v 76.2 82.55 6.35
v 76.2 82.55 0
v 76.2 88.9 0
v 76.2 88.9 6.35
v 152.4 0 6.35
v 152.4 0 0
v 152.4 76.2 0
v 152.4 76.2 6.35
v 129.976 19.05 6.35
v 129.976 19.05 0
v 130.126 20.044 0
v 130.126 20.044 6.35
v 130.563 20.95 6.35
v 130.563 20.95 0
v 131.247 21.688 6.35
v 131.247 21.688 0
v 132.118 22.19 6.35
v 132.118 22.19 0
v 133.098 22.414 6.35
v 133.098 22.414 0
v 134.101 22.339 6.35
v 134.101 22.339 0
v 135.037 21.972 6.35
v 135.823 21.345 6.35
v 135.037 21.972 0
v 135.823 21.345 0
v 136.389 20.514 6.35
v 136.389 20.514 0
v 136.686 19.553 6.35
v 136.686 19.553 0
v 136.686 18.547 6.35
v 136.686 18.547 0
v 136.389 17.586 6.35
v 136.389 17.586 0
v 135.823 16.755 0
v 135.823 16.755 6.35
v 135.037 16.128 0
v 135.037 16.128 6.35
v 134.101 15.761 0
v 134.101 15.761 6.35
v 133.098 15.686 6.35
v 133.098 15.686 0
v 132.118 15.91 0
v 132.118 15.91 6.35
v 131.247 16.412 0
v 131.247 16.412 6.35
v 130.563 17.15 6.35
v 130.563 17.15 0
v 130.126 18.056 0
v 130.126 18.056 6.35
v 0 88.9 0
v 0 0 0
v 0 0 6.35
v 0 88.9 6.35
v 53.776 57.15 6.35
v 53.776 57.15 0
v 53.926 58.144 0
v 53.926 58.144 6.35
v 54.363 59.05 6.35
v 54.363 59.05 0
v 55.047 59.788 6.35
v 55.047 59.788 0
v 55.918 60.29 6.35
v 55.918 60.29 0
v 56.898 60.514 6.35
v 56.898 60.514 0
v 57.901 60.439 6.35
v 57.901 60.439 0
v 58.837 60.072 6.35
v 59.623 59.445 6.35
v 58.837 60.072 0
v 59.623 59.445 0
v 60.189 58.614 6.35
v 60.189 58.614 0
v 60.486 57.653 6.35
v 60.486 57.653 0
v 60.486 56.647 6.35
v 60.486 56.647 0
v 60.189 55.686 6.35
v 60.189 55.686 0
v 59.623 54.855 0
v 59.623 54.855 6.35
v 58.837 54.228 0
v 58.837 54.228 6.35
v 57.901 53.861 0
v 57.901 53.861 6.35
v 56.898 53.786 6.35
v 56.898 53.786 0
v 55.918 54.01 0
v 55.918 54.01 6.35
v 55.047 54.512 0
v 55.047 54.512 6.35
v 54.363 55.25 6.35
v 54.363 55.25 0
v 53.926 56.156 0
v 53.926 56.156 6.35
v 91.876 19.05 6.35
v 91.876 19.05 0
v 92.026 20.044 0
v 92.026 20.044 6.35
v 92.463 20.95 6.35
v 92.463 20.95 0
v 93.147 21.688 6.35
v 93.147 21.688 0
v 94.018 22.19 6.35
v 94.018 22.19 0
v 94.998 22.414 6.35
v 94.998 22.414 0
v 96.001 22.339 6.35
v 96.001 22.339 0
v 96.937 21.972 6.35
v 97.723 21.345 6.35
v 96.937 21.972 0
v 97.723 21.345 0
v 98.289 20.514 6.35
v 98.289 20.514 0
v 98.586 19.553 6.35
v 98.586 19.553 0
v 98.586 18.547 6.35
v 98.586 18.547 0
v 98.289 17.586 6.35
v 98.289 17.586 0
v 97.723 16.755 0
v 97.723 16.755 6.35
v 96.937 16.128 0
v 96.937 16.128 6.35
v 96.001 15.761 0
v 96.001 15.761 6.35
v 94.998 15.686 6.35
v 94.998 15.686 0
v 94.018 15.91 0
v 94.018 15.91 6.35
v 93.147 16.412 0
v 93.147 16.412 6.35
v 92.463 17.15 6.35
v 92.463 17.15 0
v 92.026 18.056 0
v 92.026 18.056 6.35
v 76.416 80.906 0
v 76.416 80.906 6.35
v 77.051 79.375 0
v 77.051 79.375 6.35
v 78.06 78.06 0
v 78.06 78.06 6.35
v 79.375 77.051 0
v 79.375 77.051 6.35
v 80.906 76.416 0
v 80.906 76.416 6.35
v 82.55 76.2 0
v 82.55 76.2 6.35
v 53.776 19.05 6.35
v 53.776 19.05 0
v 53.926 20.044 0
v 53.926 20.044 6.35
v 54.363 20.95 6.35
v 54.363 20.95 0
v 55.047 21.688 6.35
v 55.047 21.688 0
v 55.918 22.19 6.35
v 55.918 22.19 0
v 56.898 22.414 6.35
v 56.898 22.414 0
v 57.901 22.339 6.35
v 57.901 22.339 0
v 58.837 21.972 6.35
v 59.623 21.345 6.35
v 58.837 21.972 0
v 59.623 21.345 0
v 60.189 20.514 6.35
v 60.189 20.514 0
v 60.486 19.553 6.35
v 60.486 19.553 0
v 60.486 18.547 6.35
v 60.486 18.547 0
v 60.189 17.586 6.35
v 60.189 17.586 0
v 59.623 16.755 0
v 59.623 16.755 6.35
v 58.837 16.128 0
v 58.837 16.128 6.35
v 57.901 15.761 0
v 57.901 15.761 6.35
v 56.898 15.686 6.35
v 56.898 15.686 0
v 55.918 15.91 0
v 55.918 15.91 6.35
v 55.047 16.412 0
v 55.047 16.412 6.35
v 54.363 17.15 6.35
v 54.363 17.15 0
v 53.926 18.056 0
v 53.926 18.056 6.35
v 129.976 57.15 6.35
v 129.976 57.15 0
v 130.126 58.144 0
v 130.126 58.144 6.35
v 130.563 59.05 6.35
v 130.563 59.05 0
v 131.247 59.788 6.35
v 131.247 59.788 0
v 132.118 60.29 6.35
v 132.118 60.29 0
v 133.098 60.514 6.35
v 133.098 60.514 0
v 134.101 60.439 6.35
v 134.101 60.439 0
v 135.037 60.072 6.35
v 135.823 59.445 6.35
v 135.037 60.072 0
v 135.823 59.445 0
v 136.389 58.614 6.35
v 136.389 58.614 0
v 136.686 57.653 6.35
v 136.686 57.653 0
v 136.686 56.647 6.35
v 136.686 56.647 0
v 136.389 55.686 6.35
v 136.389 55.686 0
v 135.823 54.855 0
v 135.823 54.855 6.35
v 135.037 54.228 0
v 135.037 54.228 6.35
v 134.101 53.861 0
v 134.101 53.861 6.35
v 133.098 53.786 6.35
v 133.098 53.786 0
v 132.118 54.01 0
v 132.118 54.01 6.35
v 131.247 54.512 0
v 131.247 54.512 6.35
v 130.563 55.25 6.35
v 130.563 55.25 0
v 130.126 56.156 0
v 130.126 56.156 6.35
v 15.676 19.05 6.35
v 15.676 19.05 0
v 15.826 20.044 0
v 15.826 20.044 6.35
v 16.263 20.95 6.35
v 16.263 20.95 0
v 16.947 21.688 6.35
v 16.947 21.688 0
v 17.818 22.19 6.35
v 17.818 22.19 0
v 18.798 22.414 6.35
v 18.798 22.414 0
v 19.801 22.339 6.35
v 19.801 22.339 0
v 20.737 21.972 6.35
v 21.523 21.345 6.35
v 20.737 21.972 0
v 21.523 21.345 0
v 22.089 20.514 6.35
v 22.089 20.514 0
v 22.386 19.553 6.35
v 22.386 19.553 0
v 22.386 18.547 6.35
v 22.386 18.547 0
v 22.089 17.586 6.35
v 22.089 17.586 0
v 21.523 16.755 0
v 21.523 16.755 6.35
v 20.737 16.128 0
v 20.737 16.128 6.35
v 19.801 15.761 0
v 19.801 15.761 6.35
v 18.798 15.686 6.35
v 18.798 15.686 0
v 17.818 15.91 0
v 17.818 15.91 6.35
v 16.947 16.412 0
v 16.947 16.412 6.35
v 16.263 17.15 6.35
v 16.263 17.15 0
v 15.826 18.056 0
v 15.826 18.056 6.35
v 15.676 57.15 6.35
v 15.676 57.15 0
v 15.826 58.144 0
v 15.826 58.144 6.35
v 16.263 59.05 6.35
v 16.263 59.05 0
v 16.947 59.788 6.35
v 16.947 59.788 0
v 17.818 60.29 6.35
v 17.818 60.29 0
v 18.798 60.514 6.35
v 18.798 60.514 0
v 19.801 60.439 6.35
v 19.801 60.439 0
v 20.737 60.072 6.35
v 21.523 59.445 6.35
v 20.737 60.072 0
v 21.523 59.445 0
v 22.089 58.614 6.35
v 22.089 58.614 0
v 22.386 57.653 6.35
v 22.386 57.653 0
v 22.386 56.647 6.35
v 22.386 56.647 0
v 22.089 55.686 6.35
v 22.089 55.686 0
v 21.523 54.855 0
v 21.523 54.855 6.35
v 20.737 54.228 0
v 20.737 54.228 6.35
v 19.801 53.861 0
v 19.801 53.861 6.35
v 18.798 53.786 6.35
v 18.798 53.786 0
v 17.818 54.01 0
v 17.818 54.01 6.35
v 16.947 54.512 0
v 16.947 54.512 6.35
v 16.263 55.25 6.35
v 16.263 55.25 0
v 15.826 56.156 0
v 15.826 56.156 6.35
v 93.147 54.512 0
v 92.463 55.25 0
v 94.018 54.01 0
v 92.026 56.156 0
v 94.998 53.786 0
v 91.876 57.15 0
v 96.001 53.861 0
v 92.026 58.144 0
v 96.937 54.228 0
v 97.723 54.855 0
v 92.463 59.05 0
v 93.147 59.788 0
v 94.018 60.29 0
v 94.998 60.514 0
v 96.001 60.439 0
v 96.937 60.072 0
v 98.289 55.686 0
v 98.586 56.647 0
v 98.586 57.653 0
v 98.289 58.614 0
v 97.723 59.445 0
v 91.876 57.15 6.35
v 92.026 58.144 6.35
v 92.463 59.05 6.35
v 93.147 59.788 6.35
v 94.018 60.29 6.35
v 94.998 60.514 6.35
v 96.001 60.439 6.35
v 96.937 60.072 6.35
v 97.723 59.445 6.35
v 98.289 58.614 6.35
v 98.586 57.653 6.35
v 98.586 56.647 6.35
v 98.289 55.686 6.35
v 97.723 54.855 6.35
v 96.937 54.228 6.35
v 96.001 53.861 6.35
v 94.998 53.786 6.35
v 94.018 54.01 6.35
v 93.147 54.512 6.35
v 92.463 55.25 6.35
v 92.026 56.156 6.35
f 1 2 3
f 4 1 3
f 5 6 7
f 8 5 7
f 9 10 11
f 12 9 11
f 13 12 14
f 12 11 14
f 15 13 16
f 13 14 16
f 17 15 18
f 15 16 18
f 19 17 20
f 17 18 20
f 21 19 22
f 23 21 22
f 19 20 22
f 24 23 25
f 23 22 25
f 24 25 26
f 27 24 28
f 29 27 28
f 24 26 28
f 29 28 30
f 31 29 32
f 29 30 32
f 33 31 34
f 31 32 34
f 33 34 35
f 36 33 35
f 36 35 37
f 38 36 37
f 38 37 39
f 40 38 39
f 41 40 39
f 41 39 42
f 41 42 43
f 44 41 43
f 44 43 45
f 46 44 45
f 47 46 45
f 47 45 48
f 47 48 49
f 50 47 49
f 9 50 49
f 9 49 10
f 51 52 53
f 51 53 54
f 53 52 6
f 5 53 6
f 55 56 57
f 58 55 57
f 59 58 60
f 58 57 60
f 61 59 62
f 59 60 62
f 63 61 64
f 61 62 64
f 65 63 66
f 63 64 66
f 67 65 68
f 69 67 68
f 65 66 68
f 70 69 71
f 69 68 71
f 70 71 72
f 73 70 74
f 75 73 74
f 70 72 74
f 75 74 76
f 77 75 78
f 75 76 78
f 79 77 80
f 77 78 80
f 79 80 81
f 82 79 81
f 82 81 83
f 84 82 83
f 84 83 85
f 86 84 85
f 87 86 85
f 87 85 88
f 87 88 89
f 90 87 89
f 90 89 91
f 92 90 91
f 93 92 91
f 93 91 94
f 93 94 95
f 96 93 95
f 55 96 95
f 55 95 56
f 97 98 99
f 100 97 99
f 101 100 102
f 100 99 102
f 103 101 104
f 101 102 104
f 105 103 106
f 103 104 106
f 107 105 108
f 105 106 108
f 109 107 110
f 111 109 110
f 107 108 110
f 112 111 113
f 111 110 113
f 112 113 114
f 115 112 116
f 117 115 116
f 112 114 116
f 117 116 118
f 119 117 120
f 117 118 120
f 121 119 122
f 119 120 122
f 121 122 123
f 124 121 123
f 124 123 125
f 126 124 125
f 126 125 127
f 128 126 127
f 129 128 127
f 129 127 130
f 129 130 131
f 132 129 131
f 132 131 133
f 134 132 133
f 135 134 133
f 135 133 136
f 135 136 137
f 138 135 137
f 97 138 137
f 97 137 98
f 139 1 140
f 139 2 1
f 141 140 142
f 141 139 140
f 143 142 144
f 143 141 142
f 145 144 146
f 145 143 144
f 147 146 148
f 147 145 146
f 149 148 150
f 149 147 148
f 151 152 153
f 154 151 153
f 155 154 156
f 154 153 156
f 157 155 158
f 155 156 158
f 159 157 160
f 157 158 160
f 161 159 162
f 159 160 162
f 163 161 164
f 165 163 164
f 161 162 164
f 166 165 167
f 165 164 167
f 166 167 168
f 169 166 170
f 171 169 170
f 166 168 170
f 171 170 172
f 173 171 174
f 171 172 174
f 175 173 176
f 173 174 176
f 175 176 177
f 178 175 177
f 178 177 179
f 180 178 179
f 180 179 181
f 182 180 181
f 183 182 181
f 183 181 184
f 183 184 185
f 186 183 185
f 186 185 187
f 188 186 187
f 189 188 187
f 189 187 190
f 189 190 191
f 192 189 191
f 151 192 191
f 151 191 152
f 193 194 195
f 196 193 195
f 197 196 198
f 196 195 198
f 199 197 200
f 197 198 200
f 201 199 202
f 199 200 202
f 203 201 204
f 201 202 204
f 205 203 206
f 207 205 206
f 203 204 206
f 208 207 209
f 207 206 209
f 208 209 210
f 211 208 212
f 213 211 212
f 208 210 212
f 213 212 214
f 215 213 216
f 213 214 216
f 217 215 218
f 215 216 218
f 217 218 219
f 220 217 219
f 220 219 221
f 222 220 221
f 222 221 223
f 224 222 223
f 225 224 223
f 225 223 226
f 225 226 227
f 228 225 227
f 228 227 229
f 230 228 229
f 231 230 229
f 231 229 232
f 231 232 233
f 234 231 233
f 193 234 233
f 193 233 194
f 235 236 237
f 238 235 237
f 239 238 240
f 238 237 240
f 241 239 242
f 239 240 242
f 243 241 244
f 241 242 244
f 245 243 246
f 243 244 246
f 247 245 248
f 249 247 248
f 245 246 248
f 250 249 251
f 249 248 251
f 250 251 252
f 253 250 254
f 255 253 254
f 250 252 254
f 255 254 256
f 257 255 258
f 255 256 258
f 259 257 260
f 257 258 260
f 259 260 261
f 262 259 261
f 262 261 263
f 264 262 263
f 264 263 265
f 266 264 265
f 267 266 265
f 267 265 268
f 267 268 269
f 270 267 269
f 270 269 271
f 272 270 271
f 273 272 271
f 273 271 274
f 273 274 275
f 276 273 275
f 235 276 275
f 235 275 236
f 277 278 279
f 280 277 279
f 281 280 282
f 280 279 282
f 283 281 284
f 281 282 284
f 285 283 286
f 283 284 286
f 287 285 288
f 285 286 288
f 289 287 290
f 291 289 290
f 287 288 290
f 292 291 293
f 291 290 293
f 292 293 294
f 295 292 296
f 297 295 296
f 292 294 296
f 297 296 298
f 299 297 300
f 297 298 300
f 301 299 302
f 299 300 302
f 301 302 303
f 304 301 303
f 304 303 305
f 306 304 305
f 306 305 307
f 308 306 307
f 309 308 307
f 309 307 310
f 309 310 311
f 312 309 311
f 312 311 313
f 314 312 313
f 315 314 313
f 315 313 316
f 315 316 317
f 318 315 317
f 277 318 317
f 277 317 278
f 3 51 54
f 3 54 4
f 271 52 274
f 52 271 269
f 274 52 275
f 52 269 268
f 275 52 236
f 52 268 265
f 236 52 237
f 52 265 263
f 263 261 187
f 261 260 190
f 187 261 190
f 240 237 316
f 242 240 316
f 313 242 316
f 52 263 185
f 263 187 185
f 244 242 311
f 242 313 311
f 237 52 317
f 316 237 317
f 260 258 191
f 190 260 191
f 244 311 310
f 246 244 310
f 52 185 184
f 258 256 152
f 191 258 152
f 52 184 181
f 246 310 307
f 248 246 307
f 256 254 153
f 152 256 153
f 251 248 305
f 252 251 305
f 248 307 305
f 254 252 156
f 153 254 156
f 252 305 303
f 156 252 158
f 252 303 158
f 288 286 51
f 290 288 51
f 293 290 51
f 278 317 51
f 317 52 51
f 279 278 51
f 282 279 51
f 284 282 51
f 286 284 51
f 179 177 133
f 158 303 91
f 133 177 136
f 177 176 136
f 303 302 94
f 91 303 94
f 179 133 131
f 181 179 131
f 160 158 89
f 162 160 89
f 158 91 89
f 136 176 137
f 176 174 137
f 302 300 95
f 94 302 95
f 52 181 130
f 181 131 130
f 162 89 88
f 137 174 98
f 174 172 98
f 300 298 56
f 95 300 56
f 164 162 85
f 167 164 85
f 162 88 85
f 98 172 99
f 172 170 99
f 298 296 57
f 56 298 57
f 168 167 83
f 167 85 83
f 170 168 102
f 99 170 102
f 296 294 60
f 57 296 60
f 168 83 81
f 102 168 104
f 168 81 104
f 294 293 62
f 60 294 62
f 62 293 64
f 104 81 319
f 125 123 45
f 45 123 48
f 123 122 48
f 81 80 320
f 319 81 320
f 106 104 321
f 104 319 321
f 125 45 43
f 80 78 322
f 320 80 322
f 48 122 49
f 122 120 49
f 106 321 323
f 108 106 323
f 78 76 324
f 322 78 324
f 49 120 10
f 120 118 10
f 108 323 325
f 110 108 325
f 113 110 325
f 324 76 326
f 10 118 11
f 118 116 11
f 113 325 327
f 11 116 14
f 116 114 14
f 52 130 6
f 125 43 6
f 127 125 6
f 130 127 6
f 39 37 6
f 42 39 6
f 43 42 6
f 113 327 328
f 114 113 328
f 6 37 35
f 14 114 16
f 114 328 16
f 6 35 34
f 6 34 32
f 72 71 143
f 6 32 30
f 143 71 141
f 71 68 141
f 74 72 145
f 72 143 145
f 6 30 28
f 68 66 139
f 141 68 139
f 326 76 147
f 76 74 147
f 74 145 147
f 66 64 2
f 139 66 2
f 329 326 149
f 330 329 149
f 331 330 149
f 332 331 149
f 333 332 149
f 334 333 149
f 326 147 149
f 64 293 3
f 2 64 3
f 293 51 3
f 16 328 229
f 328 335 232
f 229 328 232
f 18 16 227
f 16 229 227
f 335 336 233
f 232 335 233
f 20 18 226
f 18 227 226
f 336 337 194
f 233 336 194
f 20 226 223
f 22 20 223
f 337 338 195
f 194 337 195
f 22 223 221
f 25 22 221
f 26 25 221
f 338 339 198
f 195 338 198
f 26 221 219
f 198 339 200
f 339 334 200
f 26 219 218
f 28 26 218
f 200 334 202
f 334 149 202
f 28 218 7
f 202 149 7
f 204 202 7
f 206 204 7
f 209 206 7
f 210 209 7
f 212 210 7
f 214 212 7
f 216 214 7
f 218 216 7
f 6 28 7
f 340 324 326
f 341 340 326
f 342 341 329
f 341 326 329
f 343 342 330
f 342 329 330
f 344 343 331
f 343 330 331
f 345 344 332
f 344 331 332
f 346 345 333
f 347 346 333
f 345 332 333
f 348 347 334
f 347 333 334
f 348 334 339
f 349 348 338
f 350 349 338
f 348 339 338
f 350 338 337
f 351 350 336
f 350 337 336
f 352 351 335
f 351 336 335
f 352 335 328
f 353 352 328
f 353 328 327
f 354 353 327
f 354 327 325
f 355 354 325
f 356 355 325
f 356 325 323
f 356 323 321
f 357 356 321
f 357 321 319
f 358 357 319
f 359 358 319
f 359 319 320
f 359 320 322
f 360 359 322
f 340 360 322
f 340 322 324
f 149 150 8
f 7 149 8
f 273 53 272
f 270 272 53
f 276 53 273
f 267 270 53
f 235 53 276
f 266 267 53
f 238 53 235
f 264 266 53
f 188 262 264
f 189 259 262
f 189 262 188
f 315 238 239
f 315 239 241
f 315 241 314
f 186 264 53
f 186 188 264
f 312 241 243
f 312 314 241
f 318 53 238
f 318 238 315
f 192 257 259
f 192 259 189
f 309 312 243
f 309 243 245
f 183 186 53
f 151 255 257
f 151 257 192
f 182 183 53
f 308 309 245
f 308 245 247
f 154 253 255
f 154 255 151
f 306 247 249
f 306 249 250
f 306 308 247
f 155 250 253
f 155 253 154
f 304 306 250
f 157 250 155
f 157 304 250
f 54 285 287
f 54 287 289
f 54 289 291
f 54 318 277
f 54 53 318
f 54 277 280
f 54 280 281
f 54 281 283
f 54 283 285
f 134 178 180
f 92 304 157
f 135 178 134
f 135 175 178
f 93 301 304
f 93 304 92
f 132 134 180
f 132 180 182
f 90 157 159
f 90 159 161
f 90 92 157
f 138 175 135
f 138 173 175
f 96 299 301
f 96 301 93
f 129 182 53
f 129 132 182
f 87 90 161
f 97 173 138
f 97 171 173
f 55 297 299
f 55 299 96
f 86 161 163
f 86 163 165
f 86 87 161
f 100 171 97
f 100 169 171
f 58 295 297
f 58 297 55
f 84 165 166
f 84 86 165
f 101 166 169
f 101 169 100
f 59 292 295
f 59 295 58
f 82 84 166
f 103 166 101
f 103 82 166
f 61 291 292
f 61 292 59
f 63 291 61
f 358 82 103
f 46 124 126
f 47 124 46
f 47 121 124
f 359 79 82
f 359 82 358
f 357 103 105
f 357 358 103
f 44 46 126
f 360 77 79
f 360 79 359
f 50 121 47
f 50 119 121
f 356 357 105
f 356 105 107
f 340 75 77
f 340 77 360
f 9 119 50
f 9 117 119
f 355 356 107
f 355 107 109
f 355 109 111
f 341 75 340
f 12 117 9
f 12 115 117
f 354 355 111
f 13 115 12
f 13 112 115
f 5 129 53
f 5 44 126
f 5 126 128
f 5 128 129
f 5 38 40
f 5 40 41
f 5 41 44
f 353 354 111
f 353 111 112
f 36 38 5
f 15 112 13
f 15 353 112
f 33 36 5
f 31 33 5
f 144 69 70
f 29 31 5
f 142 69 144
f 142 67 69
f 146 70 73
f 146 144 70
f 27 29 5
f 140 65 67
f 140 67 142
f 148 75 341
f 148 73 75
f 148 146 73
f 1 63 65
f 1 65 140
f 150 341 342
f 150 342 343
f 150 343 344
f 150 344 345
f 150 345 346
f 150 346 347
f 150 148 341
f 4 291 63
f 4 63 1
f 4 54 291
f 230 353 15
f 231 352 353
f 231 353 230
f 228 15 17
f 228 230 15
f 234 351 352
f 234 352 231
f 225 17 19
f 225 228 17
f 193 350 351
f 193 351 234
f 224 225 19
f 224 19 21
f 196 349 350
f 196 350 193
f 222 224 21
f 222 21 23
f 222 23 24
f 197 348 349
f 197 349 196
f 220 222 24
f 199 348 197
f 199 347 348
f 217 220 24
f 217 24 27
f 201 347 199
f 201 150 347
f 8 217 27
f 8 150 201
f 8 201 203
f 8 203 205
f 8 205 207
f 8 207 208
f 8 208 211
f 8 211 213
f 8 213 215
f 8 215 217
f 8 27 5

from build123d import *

# Parameters (mm, degrees)
SKETCH1_W                        = 152.4
SKETCH1_H                        = 88.9
BOSS_EXTRUDE1_DEPTH              = 6.35
F_17_64_0_26563_DIAMETER_HOLE1_D = 6.747002
LPATTERN1_COUNT                  = 4
LPATTERN1_PITCH                  = 38.1
LPATTERN1_COUNT_DIR2             = 2
LPATTERN1_PITCH_DIR2             = 38.1
SKETCH4_W                        = 76.2
SKETCH4_H                        = 12.7
CUT_EXTRUDE1_DEPTH               = 177.548272436
FILLET1_R                        = 6.35


with BuildPart() as part:
    # Sketch1 → Boss-Extrude1 (new body)
    with BuildSketch(Plane.XY):
        with Locations((76.2, 44.45)):
            Rectangle(SKETCH1_W, SKETCH1_H)
    extrude(amount=BOSS_EXTRUDE1_DEPTH)

    # 17/64 (0.26563) Diameter Hole1 (through all)
    with Locations(Plane.XY.offset(6.35)):
        with Locations((19.05, 19.05)):
            f_17_64_0_26563_diameter_hole1 = Hole(F_17_64_0_26563_DIAMETER_HOLE1_D / 2)

    # LPattern1: 17_64 _0.26563_ Diameter Hole1 4 × 2
    with Locations(*[(i * LPATTERN1_PITCH, j * LPATTERN1_PITCH_DIR2, 0) for i in range(LPATTERN1_COUNT) for j in range(LPATTERN1_COUNT_DIR2) if (i, j) != (0, 0)]):
        add(f_17_64_0_26563_diameter_hole1, mode=Mode.SUBTRACT)

    # Sketch4 → Cut-Extrude1 (cut, through all)
    with BuildSketch(Plane.XY.offset(6.35)):
        with Locations((114.3, 82.55)):
            Rectangle(SKETCH4_W, SKETCH4_H)
    extrude(amount=-CUT_EXTRUDE1_DEPTH, mode=Mode.SUBTRACT)

    # Fillet1
    fillet1_edges = [part.edges().sort_by_distance(p)[0] for p in [
        (76.2, 76.2, 3.175),
    ]]
    fillet(fillet1_edges, radius=FILLET1_R)


solid = part.part
